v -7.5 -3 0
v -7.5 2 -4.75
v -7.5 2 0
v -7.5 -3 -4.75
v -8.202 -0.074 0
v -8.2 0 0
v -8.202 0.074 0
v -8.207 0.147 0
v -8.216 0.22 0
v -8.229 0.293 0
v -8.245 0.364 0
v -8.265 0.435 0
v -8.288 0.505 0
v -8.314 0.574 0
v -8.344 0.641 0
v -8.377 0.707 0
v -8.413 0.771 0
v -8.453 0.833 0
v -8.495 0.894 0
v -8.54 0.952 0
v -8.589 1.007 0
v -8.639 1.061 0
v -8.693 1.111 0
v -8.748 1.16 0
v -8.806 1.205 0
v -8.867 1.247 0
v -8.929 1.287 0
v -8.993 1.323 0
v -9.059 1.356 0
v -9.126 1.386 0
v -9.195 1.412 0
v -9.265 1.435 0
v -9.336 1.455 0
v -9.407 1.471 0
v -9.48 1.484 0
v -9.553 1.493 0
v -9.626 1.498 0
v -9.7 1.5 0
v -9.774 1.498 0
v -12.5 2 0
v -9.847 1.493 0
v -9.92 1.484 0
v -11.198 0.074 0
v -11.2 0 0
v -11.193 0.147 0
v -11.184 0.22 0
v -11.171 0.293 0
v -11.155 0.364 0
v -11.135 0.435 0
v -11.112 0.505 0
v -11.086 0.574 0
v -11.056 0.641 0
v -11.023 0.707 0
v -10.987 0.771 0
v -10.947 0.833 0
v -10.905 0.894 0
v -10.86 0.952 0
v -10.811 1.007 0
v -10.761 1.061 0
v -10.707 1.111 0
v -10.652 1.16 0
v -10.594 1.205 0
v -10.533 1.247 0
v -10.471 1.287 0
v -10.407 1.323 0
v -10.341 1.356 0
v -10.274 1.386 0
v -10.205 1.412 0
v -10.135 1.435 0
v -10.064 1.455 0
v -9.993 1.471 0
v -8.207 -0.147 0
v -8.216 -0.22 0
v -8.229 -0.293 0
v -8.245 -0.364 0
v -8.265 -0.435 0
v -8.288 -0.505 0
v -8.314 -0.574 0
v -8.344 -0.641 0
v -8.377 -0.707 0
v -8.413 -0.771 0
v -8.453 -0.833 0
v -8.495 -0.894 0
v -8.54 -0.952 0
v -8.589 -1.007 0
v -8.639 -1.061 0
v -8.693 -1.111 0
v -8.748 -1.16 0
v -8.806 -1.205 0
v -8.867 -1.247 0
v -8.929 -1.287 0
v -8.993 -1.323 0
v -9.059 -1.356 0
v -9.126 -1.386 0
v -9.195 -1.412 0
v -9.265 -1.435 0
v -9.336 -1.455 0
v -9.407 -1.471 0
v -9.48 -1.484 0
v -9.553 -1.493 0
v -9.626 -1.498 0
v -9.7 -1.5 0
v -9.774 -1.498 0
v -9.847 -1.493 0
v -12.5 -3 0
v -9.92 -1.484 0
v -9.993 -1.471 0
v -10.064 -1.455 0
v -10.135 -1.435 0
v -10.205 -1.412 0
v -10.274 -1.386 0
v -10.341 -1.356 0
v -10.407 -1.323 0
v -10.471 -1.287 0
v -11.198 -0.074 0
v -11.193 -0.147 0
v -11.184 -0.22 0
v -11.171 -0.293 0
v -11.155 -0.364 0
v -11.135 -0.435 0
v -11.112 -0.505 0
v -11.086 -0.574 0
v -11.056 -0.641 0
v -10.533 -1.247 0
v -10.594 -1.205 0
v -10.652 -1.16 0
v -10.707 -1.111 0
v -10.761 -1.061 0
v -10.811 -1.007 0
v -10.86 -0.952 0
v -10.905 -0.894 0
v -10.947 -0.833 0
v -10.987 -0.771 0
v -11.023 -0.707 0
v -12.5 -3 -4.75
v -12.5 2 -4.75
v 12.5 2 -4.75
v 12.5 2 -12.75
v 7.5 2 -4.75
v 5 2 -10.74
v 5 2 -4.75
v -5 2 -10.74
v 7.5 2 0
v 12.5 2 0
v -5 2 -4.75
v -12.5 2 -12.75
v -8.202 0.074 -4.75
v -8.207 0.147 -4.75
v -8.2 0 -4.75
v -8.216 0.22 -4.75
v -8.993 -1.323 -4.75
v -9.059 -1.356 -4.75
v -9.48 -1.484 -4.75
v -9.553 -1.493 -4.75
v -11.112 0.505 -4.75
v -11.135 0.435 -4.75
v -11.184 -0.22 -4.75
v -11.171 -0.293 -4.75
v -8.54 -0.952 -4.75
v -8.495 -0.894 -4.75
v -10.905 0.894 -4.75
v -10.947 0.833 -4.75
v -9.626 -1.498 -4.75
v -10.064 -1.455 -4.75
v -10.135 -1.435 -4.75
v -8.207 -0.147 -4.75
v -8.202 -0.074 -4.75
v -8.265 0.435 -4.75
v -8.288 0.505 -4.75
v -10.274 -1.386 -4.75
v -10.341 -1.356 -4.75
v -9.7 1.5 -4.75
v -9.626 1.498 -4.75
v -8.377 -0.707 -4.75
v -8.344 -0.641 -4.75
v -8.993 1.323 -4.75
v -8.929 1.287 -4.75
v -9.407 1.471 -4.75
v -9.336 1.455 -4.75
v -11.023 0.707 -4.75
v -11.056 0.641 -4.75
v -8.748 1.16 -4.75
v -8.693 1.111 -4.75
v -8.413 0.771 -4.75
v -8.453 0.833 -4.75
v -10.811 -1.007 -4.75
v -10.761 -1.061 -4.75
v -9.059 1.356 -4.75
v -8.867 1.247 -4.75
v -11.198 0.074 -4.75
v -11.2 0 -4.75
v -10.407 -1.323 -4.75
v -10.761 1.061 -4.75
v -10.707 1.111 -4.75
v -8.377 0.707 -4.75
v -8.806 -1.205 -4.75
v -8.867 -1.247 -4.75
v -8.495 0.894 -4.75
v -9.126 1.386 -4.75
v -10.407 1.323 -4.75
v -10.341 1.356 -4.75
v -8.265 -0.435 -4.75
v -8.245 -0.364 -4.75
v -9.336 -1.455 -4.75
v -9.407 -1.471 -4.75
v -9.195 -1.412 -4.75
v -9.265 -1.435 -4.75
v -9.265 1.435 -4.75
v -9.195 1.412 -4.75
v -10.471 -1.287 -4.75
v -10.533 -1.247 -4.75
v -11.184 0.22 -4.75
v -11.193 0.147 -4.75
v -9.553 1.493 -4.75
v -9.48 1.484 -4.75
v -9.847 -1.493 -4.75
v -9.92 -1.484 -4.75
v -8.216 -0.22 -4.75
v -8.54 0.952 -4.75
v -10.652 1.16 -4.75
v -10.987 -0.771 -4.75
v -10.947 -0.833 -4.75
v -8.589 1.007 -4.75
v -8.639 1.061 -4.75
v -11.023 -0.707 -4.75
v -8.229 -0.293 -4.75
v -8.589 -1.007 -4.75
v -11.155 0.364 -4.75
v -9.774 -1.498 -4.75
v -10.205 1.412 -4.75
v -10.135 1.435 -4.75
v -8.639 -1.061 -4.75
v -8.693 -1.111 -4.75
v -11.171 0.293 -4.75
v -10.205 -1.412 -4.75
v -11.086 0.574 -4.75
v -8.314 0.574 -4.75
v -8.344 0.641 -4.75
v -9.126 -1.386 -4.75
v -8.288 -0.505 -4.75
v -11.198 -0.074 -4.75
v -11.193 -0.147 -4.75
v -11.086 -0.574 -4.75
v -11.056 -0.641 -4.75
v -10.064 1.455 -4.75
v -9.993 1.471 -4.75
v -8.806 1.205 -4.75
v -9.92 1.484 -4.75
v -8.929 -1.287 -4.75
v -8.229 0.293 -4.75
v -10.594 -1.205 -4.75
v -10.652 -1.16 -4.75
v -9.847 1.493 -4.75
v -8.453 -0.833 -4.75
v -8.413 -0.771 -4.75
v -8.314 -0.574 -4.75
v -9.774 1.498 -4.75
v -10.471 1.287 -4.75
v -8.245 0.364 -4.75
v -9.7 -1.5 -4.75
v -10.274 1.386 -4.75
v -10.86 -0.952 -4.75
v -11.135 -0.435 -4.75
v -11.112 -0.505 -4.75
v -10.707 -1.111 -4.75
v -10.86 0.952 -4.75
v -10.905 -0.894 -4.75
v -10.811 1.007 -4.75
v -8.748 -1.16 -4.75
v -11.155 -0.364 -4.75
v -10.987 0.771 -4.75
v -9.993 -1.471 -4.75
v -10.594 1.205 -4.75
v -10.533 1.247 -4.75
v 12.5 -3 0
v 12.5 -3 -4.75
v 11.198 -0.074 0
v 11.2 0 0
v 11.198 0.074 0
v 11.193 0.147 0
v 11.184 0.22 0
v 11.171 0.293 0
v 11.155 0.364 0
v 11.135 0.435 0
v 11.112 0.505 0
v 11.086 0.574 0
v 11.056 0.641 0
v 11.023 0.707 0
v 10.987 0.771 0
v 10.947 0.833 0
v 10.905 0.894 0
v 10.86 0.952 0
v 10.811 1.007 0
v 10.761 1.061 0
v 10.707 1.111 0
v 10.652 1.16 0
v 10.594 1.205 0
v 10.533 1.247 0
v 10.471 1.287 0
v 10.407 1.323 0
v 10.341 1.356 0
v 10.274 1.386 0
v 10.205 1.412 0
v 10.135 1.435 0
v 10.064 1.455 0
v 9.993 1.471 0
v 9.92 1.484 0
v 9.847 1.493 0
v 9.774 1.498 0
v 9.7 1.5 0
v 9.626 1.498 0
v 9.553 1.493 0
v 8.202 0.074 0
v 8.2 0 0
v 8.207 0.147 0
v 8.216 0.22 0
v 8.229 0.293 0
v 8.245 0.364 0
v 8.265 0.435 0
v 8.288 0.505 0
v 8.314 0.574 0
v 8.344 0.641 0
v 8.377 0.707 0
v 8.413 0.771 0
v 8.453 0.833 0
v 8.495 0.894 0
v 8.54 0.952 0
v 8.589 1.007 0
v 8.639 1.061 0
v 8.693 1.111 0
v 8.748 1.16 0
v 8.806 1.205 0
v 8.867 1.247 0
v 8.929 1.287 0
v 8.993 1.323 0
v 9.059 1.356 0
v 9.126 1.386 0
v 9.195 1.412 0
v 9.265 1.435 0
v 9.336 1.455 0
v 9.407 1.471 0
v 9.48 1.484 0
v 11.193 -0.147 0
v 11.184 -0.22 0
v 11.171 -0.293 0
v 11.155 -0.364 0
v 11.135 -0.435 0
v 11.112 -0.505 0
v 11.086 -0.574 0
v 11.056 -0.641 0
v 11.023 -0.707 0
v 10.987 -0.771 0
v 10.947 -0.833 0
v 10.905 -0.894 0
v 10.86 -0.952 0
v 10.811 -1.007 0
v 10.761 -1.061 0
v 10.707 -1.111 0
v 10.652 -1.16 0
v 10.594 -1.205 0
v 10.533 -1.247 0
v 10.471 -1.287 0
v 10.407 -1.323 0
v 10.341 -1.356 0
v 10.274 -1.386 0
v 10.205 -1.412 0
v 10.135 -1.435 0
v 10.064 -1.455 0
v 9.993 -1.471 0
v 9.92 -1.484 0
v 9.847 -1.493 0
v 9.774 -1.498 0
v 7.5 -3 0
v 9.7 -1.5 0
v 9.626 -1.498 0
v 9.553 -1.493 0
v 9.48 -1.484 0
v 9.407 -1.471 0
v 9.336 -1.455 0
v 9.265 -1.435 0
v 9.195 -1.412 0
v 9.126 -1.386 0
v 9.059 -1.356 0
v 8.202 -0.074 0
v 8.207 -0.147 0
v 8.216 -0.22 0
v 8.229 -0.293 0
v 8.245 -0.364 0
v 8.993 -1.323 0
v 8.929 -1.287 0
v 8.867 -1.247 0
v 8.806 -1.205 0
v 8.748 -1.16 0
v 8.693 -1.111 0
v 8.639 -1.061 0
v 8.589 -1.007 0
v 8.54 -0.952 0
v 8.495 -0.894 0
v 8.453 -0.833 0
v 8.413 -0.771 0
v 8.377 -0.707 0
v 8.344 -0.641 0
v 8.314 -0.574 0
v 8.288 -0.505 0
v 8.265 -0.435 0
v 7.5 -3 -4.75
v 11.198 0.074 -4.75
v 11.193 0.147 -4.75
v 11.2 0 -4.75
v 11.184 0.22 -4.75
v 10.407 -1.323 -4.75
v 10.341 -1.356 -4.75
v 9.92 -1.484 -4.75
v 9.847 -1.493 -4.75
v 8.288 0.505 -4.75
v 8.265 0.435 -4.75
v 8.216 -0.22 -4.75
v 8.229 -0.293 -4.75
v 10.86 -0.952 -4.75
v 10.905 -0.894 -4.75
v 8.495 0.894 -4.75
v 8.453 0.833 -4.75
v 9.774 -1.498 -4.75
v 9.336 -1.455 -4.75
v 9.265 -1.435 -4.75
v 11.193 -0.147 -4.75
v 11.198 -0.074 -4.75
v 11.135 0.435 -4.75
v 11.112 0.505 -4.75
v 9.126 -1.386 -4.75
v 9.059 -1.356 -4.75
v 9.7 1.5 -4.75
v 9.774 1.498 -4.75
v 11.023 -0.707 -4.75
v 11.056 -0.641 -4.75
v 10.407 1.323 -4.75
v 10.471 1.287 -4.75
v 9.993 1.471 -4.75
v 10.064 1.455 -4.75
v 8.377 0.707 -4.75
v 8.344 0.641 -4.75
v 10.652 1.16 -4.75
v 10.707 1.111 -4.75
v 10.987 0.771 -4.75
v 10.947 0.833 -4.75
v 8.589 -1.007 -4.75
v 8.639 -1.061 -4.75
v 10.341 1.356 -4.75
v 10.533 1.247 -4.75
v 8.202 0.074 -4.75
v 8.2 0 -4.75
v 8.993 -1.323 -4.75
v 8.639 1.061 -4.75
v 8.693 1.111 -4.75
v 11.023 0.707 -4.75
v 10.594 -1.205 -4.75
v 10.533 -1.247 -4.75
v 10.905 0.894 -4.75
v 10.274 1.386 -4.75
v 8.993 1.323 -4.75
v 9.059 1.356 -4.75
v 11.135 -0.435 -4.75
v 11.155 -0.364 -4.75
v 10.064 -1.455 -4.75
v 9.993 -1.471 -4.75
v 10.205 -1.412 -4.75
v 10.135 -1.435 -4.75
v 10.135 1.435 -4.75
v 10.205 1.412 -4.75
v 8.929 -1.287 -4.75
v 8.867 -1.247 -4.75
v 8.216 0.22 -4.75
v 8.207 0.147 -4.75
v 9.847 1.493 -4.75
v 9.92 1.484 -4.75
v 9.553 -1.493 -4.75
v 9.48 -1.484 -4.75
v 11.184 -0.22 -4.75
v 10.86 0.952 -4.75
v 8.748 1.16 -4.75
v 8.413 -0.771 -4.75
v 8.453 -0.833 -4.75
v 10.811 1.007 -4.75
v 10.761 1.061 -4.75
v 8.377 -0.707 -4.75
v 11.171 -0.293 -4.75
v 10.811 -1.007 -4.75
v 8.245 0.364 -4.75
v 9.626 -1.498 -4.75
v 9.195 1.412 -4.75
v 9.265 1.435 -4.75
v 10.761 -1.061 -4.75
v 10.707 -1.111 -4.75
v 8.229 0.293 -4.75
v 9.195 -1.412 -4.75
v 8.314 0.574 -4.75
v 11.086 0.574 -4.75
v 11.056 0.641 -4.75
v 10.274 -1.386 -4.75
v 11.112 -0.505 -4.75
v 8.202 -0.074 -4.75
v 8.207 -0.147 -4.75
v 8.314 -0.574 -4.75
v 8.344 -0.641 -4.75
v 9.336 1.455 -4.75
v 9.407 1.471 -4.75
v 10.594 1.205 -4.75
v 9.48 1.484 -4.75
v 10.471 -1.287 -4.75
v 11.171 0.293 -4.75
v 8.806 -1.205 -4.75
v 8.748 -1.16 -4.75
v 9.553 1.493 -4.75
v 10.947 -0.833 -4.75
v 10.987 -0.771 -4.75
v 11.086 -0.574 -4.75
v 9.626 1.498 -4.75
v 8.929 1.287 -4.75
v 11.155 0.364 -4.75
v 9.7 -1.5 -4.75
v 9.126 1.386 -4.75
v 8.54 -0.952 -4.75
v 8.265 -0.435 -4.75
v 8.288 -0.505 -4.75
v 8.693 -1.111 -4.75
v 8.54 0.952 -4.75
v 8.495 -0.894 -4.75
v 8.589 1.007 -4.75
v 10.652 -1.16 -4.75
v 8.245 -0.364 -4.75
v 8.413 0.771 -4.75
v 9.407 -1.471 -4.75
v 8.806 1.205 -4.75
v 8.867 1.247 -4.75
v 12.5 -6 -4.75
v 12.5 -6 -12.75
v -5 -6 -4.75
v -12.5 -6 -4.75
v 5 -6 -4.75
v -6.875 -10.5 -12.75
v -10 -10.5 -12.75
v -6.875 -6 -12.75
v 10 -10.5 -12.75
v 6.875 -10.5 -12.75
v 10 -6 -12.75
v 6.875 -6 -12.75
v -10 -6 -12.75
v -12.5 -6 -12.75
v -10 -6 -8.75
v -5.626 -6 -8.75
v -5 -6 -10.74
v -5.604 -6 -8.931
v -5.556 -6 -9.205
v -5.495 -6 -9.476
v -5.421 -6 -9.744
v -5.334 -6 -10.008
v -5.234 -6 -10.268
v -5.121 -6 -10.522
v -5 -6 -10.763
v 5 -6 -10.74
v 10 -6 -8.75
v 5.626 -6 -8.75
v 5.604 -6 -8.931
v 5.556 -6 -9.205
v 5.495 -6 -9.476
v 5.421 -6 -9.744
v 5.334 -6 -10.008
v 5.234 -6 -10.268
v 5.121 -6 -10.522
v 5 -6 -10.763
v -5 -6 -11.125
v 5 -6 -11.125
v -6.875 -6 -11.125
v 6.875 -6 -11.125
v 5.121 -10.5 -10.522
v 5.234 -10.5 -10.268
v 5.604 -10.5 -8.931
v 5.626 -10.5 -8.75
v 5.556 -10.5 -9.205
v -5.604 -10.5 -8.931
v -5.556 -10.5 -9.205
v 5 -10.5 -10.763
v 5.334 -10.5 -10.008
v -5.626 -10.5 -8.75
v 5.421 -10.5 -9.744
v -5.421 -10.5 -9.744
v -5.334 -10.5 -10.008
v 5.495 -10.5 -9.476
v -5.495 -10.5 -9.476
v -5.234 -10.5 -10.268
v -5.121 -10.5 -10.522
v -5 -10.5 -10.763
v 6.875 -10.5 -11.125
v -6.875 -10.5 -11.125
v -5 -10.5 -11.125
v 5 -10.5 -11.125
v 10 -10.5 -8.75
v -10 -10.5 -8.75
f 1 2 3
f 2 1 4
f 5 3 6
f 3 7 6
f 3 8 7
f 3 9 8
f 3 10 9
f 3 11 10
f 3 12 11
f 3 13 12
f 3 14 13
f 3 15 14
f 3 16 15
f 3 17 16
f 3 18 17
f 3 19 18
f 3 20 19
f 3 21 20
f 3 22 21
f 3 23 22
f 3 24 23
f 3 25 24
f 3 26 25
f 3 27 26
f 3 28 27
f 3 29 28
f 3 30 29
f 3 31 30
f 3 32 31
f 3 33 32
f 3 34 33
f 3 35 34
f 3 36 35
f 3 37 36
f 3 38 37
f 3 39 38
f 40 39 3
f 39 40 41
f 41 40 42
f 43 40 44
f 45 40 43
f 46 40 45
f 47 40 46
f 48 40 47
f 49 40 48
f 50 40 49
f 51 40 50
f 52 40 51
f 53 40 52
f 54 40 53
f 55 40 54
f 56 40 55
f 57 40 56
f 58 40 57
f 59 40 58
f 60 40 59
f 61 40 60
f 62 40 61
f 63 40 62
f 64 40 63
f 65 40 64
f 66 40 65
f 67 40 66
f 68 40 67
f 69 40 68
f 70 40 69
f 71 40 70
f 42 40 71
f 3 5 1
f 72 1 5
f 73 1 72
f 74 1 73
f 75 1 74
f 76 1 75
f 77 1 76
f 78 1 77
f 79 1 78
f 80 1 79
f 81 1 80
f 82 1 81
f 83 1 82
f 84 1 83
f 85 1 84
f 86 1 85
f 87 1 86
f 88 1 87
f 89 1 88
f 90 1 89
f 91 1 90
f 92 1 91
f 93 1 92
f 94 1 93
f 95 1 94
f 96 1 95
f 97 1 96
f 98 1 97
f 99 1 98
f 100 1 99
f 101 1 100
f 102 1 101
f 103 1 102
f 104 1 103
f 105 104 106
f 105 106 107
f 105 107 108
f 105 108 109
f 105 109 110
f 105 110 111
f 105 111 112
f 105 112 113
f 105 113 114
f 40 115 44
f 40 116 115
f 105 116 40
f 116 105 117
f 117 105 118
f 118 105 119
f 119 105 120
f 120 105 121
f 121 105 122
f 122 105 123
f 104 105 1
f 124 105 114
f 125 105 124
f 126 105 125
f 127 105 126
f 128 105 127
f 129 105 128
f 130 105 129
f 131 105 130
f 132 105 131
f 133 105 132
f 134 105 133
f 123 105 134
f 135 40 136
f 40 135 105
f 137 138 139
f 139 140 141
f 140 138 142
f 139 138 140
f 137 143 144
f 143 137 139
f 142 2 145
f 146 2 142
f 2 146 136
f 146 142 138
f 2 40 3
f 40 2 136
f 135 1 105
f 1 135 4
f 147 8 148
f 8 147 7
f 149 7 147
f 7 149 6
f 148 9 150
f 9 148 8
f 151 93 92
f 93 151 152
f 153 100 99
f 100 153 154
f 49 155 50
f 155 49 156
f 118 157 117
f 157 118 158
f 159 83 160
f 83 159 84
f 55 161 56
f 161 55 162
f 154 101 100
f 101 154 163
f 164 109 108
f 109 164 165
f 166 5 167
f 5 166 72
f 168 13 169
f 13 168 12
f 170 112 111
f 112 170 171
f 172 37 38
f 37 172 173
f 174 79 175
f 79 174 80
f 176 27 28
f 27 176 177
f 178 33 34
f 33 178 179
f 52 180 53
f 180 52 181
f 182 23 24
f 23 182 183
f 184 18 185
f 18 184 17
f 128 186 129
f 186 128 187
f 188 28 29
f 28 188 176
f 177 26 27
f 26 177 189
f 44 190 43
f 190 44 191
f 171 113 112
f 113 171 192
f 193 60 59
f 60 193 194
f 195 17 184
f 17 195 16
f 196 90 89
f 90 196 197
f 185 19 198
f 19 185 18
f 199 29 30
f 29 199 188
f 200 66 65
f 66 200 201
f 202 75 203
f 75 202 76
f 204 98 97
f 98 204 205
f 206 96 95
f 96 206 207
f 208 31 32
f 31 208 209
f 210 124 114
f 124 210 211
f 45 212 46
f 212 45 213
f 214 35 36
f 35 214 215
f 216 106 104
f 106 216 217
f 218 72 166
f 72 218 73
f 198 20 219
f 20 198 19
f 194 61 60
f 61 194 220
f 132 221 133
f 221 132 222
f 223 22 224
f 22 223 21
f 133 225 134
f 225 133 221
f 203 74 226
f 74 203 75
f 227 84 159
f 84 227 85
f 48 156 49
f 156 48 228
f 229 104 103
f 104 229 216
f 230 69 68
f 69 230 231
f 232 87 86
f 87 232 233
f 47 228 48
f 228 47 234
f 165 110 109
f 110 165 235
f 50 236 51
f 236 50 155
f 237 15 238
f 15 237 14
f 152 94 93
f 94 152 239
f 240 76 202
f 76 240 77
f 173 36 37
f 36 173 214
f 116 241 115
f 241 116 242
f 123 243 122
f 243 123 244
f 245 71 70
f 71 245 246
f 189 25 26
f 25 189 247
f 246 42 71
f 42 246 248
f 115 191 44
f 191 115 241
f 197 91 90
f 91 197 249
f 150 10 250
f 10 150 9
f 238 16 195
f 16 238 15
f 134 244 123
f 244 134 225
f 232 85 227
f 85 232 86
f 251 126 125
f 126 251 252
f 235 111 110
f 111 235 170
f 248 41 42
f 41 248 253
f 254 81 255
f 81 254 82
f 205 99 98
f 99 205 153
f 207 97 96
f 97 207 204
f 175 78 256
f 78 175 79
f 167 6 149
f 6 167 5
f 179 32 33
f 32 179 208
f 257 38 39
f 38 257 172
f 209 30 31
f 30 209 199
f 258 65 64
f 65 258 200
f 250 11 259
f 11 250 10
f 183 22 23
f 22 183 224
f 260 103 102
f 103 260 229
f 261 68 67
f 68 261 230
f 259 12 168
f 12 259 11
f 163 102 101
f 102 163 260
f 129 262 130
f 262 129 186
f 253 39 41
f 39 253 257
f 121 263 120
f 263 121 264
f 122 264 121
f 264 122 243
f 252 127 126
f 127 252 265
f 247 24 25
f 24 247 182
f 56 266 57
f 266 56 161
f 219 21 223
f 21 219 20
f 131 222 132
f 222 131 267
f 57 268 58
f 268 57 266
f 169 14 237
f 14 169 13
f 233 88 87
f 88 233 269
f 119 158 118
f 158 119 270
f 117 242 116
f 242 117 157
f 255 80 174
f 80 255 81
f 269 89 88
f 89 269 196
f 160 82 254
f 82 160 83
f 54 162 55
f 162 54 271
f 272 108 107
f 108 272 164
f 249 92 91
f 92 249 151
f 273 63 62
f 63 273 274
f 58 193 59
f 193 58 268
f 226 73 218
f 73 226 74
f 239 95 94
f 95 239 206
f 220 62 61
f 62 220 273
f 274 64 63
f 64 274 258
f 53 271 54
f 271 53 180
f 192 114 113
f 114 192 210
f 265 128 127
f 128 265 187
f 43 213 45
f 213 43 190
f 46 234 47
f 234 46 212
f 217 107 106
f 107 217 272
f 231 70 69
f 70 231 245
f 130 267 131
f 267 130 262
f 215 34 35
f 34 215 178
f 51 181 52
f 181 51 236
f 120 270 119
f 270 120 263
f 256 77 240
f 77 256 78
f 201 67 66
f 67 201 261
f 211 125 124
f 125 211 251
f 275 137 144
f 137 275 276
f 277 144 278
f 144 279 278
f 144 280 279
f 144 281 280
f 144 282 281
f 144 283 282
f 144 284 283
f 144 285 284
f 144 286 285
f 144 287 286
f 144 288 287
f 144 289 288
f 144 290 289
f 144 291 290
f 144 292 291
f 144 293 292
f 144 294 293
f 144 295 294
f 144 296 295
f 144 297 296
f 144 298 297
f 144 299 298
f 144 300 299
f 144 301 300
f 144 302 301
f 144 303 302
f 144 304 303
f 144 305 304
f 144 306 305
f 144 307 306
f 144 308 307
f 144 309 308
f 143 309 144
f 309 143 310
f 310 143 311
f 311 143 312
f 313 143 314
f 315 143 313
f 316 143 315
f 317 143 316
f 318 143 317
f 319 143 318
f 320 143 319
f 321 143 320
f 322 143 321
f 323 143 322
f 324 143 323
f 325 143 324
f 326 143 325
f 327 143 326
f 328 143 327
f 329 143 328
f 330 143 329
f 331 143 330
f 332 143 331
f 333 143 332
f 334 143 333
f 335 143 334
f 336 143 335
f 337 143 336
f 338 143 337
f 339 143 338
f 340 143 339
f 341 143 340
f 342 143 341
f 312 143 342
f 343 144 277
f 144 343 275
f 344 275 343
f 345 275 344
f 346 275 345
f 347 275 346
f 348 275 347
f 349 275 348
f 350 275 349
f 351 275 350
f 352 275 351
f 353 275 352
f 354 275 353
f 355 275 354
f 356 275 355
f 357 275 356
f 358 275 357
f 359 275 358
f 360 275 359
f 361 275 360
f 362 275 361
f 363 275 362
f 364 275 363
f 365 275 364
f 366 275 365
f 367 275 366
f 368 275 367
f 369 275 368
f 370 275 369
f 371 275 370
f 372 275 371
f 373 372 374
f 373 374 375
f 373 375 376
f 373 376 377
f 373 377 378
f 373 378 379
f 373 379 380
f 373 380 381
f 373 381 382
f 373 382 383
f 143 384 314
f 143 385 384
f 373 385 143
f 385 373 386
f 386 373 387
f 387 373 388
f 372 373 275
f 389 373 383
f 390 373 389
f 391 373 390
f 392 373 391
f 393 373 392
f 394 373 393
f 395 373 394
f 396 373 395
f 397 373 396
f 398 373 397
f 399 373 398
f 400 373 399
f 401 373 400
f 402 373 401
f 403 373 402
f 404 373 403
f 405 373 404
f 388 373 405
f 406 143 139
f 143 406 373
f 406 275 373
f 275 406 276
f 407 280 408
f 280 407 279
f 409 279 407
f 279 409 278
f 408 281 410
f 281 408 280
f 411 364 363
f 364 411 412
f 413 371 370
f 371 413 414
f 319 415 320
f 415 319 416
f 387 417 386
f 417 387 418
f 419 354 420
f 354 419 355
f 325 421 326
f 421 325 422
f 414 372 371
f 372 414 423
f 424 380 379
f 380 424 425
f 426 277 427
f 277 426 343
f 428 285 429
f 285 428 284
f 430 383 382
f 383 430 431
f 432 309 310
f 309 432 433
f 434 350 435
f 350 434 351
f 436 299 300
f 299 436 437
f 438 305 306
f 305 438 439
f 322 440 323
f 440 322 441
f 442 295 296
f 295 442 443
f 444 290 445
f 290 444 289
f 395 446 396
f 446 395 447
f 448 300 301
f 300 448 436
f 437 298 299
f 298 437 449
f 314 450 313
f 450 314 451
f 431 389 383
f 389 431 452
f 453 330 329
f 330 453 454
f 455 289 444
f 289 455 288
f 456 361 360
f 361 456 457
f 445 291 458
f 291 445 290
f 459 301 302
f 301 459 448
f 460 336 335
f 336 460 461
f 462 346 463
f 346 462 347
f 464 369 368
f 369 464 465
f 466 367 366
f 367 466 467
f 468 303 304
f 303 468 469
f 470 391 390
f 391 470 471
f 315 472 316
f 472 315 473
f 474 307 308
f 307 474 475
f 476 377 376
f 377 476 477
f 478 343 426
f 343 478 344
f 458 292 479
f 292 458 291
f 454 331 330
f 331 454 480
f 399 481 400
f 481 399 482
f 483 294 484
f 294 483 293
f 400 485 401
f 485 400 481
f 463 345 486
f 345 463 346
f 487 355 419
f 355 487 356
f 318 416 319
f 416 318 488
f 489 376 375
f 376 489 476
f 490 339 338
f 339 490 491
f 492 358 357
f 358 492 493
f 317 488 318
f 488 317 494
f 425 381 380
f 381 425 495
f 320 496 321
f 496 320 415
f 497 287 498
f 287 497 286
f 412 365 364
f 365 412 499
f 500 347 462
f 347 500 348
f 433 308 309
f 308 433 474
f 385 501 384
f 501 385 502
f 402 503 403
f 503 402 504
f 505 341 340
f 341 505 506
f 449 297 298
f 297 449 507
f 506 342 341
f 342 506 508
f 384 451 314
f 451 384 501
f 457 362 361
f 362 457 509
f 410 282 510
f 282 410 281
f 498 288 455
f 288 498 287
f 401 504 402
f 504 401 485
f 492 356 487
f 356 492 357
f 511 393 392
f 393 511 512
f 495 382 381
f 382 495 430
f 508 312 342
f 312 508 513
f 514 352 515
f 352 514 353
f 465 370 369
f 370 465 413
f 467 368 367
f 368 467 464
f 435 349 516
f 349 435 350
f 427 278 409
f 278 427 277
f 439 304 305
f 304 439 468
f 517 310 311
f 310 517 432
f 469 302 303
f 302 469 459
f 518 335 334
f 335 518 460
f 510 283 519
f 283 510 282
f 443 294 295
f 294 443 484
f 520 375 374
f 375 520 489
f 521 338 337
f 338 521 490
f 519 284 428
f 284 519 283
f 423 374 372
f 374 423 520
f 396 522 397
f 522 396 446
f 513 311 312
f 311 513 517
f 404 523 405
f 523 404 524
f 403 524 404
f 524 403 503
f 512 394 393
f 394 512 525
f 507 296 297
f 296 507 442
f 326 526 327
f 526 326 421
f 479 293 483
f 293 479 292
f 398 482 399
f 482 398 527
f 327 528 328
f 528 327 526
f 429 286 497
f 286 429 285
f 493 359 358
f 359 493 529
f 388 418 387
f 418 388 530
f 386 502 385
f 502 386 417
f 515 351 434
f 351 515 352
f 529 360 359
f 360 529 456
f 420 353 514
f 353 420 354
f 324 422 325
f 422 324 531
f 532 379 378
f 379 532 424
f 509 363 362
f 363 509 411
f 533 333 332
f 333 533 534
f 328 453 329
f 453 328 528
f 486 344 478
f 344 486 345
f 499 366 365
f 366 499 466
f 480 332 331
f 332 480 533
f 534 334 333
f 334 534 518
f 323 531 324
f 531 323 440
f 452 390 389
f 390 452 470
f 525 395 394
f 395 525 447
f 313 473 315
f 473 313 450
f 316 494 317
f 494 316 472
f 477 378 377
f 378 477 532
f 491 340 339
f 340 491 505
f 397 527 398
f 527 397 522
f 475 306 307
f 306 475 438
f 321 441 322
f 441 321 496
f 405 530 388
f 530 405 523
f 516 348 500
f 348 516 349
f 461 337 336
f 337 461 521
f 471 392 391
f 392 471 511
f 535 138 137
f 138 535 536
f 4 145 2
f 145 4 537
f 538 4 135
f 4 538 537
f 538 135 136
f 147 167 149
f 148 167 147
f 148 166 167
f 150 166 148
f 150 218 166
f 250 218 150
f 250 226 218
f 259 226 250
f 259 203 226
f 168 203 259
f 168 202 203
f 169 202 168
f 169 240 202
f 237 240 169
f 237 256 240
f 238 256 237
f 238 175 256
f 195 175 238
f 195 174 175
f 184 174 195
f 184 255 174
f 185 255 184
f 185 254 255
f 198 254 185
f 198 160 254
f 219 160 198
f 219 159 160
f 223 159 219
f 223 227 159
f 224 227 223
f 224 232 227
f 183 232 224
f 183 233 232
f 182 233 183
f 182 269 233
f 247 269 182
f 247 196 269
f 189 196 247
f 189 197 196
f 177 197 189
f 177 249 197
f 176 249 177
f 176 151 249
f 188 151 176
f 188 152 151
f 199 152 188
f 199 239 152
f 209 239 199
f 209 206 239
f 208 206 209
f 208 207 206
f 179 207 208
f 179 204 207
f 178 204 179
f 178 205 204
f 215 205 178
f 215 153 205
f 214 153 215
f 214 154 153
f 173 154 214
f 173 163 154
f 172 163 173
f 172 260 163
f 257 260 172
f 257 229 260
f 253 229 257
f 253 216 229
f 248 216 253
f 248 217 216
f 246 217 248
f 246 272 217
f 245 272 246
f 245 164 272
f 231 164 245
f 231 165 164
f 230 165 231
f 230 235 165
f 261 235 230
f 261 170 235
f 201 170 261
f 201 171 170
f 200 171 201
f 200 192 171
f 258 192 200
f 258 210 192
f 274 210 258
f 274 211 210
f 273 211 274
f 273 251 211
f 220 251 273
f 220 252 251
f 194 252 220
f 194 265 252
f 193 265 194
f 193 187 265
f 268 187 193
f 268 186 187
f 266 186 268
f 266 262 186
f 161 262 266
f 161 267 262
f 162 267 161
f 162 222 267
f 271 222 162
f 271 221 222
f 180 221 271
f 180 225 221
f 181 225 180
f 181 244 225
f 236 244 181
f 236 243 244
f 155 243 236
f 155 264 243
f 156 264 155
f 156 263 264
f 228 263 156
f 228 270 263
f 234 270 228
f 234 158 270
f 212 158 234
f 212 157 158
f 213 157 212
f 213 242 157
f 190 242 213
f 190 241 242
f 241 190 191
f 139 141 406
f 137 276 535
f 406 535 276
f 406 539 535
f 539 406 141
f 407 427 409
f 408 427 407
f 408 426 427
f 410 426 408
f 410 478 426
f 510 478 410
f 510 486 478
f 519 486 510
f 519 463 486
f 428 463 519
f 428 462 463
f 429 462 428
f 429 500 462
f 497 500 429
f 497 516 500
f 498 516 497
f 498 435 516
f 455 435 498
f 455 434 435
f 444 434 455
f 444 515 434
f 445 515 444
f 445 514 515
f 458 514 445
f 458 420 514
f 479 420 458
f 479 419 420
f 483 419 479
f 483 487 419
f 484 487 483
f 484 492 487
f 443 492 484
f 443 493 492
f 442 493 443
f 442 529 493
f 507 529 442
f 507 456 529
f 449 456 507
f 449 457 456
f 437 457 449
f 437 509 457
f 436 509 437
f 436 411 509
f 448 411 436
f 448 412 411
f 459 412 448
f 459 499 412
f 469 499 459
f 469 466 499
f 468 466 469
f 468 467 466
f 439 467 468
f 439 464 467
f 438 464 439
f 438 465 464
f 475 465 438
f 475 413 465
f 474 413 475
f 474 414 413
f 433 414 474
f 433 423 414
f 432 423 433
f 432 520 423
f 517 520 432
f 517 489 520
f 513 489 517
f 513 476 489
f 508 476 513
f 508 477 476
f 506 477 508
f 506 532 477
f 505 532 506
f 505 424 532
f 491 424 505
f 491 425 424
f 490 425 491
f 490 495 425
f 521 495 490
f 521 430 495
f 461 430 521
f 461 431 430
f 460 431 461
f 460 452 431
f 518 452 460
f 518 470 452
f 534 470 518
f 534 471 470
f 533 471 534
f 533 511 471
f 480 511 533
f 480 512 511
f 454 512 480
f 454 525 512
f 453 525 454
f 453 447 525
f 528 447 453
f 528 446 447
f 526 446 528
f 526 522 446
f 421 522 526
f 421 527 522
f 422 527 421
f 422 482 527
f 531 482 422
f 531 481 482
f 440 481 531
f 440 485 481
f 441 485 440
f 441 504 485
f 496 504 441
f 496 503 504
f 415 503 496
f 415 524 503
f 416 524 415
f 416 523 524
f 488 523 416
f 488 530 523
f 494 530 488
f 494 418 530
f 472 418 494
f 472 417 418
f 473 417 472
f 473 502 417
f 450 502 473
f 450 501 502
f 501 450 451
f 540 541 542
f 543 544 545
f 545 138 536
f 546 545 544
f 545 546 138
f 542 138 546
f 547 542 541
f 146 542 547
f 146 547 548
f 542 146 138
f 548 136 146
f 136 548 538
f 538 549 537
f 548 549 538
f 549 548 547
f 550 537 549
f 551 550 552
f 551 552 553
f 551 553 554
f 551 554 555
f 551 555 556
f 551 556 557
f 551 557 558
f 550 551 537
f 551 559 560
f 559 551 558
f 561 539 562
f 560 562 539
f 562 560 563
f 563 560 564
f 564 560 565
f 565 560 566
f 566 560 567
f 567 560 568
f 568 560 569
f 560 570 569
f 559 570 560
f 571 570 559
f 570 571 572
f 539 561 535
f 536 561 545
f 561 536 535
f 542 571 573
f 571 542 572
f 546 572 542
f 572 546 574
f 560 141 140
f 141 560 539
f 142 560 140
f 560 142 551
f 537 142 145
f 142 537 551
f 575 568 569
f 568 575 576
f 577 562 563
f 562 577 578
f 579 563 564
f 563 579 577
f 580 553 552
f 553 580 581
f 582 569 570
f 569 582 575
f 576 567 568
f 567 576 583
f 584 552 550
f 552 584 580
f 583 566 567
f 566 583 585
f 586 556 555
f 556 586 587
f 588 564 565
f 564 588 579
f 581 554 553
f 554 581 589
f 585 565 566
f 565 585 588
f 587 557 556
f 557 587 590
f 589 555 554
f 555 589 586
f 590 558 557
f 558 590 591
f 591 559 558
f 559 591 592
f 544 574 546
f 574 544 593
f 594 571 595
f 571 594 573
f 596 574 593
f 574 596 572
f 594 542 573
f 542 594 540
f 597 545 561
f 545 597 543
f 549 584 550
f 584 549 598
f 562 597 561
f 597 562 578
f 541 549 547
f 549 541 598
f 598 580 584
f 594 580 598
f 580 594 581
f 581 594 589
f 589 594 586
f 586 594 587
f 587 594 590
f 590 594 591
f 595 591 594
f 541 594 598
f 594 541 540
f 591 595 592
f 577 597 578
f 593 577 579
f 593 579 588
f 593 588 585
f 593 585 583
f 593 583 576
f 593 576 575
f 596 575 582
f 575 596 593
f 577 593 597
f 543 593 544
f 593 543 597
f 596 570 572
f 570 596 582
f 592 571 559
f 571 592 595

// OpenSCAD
$fn=128;

/*
translate([])
rotate([90,0,0])
import("/home/weis/code/AutomatedBlinds/3d_files/vl53l0x.stl", convexity=3);
*/

module kabelkanal(){
    cube([12.5, 50, 1.5], center=true);
    
    translate([0,0,3.5])
    difference(){
        rotate([90,0,0])
        cylinder(r=10.3/2, h=50, center=true);
        
        rotate([90,0,0])
        cylinder(r=10.3/2-1, h=51, center=true);
        
        translate([0, 0, 5])
        cube([20, 51, 5], center=true);
        
        translate([0, 0, -6])
        cube([20, 51, 5], center=true);        
    }
}

module case(){
    translate([-9.7,0,-2.5])
    difference(){
        //cylinder(r=2, h=5, center=true);
        translate([-2.8,-3,-2.5])
        cube([5, 5, 5]);
        cylinder(r=1.5, h=5.1, center=true);
    }
    
    translate([9.7,0,-2.5])
    difference(){
        //cylinder(r=2, h=5, center=true);
        translate([-2.2,-3,-2.5])
        cube([5, 5, 5]);
        cylinder(r=1.5, h=5.1, center=true);
    }
    
    translate([0,-2,-5-3.75])
    difference(){
        cube([25, 8, 8], center=true);
        translate([0,0.1,1.01])
        cube([10, 13, 6], center=true);
    }
    
    translate([0,-8,-10.75])
    difference(){
        cube([20,5,4], center=true);
        
        translate([0,0,1.5])
        cube([10,6,4], center=true);
        
        translate([0,-20,-1.2])
        scale([1.1,1.1,1.1])
        kabelkanal();
    }
}

/*
translate([0,-31,-12])
kabelkanal();
*/
case();
